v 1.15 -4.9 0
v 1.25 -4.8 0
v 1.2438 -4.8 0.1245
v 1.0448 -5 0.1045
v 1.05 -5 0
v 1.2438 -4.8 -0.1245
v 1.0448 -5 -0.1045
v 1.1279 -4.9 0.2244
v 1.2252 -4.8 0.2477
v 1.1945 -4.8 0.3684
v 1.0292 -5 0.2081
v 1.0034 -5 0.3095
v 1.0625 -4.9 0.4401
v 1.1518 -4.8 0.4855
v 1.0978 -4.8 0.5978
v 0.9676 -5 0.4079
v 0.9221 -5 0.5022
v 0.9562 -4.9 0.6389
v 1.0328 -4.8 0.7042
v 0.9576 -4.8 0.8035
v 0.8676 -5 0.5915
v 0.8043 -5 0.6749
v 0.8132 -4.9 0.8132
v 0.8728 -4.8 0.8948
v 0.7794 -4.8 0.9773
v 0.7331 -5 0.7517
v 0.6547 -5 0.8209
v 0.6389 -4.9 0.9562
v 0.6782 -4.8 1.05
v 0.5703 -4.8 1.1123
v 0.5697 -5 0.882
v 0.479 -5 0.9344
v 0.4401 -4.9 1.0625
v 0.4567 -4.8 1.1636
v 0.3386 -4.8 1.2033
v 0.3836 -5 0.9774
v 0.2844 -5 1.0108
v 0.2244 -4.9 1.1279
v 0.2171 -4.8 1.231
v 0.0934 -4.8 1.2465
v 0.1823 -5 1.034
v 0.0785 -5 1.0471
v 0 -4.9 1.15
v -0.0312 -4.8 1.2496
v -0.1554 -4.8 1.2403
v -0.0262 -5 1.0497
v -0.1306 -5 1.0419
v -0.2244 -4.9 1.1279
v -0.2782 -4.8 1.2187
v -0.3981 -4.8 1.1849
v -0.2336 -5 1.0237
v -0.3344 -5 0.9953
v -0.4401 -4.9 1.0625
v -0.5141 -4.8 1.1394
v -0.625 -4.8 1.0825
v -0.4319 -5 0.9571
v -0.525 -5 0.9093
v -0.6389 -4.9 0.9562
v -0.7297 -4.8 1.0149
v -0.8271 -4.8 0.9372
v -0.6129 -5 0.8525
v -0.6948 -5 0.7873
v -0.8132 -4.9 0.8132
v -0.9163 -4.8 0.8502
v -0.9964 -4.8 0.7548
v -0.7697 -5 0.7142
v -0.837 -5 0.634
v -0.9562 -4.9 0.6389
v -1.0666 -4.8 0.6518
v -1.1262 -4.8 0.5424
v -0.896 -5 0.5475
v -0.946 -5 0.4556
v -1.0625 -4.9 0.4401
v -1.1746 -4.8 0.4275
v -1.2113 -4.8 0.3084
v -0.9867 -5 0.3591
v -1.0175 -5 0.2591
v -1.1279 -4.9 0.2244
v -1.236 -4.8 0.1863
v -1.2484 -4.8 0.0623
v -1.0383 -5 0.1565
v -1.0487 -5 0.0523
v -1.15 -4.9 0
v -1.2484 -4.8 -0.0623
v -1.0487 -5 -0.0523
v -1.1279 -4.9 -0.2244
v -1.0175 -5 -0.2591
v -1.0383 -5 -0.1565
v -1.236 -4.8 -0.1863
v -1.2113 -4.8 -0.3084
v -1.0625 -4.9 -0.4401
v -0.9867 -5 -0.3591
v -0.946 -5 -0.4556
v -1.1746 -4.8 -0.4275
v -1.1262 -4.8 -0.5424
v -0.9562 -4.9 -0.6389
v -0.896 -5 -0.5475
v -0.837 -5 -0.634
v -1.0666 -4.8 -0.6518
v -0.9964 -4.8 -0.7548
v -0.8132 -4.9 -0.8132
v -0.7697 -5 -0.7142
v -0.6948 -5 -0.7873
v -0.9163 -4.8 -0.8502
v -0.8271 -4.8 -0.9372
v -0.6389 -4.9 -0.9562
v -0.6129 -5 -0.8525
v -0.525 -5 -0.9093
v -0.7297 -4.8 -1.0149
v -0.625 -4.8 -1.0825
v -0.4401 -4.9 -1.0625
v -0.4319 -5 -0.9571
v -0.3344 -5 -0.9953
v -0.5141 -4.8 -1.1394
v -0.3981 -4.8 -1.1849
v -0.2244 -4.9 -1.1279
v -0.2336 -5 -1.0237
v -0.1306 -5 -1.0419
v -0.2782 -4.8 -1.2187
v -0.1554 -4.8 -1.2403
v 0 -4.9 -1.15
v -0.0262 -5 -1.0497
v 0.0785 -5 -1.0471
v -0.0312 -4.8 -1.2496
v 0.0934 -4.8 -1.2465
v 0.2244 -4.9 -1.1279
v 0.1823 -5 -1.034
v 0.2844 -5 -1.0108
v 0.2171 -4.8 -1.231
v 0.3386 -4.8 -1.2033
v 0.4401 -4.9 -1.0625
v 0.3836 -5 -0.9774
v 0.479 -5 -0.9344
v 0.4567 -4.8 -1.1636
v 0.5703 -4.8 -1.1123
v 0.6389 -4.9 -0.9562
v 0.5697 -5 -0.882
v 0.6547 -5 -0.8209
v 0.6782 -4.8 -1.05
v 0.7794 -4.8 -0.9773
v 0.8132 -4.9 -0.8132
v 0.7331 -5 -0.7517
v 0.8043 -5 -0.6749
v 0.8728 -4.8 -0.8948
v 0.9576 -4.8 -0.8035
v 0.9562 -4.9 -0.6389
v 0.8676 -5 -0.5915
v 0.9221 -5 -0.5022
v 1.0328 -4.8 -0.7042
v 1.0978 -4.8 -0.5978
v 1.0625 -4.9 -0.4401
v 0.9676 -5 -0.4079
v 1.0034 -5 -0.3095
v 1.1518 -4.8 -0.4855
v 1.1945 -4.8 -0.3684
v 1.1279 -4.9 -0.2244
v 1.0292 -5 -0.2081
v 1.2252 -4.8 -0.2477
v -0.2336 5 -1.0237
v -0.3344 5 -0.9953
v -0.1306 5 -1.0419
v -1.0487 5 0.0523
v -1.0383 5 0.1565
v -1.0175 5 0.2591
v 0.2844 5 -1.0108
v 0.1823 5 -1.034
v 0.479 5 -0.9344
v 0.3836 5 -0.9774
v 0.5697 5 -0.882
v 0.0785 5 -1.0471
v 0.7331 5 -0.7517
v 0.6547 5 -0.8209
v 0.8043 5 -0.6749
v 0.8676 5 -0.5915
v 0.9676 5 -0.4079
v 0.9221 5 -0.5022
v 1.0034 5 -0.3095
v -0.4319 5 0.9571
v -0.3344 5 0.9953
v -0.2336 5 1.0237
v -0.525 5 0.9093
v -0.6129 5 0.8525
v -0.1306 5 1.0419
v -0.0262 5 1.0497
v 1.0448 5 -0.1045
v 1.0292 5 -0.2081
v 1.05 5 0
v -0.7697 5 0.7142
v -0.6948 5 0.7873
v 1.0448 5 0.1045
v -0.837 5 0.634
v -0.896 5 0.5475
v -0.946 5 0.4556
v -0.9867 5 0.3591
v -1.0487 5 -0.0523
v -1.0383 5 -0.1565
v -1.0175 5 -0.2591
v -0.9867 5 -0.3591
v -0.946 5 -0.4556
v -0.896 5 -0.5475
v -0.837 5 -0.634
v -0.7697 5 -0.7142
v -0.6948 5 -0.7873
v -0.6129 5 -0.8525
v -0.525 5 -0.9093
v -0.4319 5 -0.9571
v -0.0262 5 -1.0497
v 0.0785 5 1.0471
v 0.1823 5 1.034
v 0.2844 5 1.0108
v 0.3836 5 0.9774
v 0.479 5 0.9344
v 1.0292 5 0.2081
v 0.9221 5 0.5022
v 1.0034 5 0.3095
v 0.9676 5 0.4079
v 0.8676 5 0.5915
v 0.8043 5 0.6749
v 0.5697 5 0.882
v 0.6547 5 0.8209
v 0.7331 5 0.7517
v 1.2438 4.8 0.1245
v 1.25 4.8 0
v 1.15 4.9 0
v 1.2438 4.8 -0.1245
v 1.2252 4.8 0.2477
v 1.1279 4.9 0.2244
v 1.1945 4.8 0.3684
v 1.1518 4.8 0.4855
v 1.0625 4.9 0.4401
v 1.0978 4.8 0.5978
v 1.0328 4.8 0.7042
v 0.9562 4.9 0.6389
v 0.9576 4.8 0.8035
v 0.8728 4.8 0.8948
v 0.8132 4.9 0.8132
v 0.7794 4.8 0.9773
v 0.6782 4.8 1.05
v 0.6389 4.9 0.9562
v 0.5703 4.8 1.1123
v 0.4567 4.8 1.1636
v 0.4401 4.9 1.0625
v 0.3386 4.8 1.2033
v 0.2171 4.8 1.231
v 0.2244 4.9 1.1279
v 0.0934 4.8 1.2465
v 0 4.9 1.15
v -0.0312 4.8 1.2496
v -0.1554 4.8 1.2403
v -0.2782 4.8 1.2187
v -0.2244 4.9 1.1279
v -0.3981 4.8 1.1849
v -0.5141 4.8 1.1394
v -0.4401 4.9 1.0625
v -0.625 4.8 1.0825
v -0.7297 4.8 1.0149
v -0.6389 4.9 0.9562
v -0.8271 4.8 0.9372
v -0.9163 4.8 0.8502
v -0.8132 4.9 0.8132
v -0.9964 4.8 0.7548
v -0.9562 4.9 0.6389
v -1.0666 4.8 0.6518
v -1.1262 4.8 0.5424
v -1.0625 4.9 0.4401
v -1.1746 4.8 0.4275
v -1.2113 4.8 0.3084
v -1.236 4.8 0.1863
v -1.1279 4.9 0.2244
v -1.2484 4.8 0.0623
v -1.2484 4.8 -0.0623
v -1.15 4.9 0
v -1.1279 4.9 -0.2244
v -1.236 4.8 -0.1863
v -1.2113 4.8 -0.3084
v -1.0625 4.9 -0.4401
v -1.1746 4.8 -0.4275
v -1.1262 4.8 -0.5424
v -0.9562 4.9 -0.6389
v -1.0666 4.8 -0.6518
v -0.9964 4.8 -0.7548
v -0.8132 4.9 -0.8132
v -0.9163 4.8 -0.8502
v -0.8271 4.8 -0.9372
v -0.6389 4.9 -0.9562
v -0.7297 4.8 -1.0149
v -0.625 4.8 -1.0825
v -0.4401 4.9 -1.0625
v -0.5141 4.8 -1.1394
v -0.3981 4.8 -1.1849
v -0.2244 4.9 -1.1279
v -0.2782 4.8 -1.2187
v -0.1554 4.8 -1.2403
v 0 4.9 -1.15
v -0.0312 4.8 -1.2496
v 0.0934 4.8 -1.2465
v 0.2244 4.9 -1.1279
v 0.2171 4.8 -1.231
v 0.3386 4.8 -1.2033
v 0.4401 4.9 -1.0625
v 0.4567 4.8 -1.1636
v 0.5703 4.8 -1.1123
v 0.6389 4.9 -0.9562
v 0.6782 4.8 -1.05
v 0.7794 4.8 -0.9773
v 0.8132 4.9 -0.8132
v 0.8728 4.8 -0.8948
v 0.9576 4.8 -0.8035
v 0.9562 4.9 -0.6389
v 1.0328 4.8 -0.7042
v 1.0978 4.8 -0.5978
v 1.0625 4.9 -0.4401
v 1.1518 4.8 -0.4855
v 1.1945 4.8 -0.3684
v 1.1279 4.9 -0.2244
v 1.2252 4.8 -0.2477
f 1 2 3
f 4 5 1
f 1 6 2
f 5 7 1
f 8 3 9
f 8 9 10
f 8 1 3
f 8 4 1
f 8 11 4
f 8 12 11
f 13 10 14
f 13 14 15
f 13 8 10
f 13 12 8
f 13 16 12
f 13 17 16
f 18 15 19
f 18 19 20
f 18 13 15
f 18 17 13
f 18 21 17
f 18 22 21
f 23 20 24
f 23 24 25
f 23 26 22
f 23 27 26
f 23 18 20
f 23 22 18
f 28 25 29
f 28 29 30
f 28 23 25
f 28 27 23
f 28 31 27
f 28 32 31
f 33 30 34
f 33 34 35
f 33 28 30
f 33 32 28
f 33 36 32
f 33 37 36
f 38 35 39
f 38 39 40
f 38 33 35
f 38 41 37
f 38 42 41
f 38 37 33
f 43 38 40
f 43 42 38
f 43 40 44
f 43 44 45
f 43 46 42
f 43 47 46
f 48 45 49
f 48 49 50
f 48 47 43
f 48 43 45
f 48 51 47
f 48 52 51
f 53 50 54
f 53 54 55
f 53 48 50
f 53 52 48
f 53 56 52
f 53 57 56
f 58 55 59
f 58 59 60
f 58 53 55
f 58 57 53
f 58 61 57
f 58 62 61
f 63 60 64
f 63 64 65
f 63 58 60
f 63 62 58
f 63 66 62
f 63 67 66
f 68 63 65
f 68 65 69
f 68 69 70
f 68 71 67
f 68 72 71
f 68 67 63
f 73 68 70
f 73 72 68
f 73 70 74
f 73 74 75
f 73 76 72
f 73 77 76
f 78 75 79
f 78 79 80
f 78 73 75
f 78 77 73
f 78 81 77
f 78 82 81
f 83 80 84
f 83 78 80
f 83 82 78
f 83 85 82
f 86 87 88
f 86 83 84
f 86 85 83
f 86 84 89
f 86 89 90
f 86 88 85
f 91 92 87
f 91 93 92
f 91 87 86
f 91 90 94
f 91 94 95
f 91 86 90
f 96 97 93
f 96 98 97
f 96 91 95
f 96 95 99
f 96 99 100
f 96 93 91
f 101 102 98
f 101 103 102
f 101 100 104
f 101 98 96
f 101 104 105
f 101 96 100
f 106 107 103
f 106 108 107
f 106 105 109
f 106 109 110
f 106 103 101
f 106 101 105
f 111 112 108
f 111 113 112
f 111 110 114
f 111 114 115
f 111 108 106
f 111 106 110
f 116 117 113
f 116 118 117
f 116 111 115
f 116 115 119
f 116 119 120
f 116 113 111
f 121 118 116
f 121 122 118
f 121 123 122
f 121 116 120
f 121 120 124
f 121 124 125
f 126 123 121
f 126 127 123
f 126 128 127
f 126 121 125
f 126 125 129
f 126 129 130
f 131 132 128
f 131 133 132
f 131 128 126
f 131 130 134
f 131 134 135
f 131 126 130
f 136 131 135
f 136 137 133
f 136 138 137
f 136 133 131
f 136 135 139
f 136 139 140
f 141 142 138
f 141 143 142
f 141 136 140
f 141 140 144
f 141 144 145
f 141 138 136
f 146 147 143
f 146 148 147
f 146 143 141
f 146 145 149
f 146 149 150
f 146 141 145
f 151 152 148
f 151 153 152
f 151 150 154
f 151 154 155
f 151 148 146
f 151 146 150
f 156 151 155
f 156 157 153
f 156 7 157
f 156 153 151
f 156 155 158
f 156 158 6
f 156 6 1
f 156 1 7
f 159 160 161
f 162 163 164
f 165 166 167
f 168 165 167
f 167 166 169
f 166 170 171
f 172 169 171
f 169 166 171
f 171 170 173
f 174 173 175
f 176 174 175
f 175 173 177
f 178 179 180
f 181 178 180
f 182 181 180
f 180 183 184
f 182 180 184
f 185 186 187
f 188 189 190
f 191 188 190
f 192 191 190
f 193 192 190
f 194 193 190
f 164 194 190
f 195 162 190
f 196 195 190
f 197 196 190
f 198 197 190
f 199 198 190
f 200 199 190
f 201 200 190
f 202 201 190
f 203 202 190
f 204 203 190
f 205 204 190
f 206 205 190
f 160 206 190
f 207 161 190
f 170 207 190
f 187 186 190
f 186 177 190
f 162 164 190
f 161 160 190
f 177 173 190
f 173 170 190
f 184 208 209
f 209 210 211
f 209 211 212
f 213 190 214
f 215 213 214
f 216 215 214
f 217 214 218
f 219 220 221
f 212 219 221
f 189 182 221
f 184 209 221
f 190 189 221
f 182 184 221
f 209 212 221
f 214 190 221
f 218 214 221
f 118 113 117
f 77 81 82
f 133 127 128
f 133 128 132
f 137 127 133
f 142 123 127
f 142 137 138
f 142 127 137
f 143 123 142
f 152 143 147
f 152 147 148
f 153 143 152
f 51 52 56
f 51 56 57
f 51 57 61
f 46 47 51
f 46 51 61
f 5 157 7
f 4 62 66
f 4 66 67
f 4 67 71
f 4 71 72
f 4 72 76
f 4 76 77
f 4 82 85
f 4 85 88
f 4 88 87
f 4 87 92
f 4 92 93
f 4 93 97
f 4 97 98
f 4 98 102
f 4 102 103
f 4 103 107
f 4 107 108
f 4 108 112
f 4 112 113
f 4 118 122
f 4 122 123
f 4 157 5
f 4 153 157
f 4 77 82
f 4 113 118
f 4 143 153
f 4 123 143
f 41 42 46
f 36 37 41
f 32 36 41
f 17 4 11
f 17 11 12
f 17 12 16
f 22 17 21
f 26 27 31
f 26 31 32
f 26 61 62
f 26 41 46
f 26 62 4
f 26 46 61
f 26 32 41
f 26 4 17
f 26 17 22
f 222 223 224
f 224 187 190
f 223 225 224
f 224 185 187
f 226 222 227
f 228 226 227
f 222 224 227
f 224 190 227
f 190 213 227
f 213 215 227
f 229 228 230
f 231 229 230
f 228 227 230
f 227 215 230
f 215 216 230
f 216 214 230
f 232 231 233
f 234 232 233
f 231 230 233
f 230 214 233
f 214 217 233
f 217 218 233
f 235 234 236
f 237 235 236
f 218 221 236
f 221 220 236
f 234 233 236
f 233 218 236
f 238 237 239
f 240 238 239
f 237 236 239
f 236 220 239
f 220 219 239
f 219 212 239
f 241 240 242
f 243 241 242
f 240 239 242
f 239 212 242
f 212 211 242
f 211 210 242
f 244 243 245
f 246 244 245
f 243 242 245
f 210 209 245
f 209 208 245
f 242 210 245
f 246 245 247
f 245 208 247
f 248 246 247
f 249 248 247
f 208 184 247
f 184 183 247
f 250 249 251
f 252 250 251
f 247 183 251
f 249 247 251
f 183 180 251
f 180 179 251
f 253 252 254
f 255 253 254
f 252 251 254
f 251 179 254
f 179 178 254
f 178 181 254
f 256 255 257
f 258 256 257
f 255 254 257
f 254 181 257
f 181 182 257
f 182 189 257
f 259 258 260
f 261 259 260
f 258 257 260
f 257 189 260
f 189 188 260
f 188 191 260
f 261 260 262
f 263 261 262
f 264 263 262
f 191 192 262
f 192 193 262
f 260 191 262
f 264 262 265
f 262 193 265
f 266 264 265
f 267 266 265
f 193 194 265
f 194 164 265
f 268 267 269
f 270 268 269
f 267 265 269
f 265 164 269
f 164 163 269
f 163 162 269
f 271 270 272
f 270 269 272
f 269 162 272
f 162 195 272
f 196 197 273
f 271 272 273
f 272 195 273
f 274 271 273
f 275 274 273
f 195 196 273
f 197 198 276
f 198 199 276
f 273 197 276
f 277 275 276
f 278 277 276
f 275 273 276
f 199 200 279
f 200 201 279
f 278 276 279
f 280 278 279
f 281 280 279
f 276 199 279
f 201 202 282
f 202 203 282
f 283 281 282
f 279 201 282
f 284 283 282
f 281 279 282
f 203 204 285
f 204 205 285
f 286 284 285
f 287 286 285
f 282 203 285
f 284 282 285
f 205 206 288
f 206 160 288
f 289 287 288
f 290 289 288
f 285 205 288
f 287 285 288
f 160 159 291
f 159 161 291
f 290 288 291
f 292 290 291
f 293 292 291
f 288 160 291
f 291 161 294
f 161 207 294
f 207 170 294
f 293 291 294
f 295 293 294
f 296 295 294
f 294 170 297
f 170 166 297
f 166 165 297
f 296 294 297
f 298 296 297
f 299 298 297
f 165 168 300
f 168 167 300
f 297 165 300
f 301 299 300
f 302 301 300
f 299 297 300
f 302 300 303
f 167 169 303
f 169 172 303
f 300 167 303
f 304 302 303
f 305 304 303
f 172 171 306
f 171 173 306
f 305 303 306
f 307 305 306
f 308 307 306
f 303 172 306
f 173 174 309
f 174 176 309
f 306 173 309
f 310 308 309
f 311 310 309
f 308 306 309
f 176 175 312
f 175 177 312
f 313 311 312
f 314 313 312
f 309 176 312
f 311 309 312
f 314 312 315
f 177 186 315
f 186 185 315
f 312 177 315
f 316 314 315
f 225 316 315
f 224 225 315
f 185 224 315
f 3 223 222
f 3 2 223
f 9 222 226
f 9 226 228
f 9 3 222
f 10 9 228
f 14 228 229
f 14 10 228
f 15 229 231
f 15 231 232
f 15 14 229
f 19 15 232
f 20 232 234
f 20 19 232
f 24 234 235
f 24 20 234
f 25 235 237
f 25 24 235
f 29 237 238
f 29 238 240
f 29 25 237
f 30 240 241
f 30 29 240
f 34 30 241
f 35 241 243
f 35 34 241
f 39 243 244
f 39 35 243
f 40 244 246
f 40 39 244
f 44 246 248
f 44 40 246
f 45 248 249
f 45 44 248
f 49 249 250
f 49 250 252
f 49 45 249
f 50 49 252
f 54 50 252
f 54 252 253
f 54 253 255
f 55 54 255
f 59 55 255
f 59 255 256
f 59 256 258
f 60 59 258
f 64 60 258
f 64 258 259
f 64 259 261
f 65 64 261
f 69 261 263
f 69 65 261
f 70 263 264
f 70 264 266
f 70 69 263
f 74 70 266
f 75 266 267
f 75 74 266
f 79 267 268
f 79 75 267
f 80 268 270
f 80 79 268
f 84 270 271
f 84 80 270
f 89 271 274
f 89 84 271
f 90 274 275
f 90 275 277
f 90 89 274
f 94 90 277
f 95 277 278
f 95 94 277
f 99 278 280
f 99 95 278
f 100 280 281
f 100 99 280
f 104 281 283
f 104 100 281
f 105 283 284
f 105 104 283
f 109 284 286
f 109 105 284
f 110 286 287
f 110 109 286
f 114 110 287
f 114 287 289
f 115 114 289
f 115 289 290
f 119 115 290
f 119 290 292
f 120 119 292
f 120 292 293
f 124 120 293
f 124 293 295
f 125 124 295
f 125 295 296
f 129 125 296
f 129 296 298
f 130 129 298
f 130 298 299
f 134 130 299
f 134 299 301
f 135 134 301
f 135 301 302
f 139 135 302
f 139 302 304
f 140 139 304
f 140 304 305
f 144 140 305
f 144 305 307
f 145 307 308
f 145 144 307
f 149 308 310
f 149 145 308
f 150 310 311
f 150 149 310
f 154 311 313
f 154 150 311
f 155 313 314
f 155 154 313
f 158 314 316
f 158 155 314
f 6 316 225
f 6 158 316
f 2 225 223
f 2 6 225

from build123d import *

# Parameters (mm, degrees)
F0_R     = 1.25
F1_DEPTH = 5
F2_SIZE  = 0.2


with BuildPart() as f1:
    # F0 (on Front) → F1 (new body)
    with BuildSketch(Plane.XZ):
        Circle(F0_R)
    extrude(amount=F1_DEPTH)

    # F2
    f2_edges = [f1.edges().sort_by_distance(p)[0] for p in [
        (-1.25, -5, 0),
    ]]
    chamfer(f2_edges, length=F2_SIZE)

    # F3: F1 across plane


with BuildPart() as f1_1:
    add(f1.part)
    add(f1.part.mirror(Plane.XZ))


solid = f1_1.part
